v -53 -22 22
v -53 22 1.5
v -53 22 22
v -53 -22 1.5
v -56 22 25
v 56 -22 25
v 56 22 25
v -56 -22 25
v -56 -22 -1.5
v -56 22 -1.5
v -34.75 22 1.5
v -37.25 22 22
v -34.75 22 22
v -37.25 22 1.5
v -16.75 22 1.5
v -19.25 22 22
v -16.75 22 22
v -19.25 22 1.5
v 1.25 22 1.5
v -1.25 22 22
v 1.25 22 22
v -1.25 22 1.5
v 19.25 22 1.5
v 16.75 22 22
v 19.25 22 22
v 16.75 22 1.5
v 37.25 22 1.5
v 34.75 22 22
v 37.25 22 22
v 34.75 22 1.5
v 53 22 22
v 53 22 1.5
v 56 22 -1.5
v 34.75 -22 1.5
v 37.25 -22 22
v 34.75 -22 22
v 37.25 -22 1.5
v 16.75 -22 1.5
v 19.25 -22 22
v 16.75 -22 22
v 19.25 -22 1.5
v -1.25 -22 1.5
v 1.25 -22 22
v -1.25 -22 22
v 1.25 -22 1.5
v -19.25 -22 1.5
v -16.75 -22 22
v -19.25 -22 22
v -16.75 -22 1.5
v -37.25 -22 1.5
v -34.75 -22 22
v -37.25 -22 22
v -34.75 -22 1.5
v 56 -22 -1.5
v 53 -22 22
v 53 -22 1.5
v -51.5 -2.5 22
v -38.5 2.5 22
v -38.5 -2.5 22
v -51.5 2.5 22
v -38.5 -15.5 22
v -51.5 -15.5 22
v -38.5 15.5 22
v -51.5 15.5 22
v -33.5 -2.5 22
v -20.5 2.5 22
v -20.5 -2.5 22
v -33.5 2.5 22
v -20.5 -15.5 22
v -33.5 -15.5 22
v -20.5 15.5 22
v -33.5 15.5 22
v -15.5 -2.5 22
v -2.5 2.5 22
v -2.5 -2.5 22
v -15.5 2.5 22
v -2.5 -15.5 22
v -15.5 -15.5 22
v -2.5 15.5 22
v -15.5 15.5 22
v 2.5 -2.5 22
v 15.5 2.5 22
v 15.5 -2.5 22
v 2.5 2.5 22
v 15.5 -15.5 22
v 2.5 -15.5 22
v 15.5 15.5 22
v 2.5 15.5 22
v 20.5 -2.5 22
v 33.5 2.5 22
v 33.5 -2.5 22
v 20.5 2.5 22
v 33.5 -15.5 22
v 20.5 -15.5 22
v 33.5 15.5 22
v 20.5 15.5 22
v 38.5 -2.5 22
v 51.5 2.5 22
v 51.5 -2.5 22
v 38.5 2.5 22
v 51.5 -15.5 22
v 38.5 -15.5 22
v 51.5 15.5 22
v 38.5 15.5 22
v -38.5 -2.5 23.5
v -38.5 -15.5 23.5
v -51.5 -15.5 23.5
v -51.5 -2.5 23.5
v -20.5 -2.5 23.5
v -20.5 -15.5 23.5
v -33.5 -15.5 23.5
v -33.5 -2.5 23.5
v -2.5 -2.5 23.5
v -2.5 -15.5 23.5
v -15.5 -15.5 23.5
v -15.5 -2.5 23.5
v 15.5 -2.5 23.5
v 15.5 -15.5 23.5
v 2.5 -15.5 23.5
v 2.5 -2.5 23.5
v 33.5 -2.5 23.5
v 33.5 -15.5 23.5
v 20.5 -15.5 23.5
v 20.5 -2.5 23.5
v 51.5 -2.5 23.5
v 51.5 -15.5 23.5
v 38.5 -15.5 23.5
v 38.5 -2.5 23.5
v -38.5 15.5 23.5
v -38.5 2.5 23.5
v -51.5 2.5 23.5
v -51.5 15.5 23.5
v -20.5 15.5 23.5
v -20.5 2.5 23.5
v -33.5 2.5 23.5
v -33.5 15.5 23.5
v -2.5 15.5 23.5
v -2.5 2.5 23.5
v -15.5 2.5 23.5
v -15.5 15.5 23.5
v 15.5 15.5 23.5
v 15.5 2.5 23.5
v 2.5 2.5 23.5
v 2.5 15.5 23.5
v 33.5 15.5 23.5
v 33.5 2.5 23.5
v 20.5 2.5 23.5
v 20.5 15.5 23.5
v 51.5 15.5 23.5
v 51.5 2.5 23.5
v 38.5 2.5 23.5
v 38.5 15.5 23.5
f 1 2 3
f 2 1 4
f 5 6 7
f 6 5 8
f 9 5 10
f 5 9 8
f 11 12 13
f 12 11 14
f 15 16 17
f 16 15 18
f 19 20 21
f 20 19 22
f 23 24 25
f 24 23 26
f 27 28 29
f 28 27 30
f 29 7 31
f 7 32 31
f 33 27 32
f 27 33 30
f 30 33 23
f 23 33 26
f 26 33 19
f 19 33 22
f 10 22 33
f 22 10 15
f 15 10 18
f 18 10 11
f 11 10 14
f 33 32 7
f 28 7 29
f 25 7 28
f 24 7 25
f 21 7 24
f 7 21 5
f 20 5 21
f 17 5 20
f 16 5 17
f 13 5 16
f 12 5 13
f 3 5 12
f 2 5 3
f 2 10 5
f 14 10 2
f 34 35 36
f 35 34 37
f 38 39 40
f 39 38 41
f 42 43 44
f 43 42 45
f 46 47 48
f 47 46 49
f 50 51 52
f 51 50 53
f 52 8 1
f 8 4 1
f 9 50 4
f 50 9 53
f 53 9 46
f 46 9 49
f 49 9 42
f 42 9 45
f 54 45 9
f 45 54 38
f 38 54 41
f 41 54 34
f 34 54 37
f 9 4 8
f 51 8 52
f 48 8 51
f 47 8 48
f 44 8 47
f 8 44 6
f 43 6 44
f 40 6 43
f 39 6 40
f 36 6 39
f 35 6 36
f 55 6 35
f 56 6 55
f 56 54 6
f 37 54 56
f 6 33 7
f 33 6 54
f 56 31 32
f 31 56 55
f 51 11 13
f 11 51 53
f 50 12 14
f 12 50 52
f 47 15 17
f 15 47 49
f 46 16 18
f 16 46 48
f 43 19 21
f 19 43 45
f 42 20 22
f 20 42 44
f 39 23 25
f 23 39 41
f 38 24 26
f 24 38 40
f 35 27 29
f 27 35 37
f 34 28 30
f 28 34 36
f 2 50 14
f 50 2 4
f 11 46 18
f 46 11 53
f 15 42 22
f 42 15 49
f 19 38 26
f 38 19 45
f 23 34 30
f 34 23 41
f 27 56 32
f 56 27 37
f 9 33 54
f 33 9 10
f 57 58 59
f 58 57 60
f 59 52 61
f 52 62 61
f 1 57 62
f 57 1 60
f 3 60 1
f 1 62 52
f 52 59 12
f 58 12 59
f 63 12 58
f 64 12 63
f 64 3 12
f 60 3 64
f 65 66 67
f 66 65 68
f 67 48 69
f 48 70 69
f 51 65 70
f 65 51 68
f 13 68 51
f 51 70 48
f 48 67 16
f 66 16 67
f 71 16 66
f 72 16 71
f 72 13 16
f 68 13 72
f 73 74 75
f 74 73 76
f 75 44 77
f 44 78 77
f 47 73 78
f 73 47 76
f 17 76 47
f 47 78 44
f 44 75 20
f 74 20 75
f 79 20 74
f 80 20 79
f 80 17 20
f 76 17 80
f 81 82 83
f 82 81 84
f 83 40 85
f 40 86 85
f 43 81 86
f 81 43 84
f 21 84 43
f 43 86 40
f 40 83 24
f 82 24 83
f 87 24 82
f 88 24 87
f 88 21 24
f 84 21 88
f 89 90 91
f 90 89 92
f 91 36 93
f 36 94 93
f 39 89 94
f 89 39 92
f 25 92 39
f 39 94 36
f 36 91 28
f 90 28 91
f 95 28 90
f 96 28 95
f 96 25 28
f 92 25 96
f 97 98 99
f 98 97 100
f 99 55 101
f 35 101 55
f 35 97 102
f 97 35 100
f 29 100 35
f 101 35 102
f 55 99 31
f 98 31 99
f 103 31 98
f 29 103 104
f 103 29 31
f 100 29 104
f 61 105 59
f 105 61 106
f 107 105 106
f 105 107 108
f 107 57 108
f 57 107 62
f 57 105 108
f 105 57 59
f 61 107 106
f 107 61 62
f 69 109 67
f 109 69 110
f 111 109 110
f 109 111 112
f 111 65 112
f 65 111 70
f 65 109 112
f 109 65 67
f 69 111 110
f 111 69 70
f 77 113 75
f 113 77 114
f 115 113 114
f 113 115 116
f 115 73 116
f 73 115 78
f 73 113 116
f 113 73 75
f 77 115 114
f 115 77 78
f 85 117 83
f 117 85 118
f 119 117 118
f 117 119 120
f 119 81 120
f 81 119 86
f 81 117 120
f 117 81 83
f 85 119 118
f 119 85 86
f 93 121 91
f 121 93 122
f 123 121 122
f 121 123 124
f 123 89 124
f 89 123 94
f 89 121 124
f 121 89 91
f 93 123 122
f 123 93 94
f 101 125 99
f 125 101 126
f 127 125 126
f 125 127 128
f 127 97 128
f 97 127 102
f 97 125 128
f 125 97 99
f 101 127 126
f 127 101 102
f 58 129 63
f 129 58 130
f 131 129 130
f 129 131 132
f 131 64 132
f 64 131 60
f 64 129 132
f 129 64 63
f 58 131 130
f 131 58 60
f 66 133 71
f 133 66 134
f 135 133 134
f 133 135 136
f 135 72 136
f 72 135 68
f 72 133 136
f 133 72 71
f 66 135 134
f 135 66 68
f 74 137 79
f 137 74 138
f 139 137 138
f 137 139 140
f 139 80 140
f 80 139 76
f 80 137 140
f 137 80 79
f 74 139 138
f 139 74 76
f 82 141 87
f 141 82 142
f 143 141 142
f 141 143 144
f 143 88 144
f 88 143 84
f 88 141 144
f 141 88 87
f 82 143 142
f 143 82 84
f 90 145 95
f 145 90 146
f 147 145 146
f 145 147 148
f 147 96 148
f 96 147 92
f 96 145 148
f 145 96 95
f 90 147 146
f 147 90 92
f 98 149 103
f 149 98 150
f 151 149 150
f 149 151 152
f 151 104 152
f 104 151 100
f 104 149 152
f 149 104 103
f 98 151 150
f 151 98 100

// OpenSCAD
// 12-cuvette rack, printed standing on its base (z = 0 to 25)
// All dimensions in mm, measured with calipers.

// --- Plate dimensions (base & deck) ---
plate_x = 112;   // X extent of base and deck plates
plate_y = 44;    // Y extent of base and deck plates
base_t  = 3;     // base plate thickness (z 0..3)
deck_t  = 3;     // deck plate thickness (z 22..25)
deck_z  = 22;    // bottom of deck plate
total_h = 25;    // overall height of the rack

// --- Wall / rib dimensions ---
end_wall_t  = 3;    // thickness of the two end walls (along X)
rib_t       = 2.5;  // thickness of the five internal ribs (along X)
rib_x       = [-36, -18, 0, 18, 36]; // X centres of the five ribs

// --- Cuvette through-holes in the deck ---
hole_size = 13;    // 13 x 13 mm square through-holes
hole_pitch = 18;   // 18 mm centre-to-centre in both X and Y
hole_rows  = 2;    // rows along Y
hole_cols  = 6;    // columns along X

$fn = 64;

// ---------------------------------------------------------------------------
// Base plate (z 0..3), centred on origin
// ---------------------------------------------------------------------------
module base_plate() { translate([0, 0, 0])
    cube([plate_x, plate_y, base_t], center = true); }

// ---------------------------------------------------------------------------
// Deck plate (z 22..25), centred on origin
// ---------------------------------------------------------------------------
module deck_plate() { translate([0, 0, deck_z + deck_t / 2])
    cube([plate_x, plate_y, deck_t], center = true); }

// ---------------------------------------------------------------------------
// Seven upright walls, full height (z 0..25), full Y depth
// ---------------------------------------------------------------------------
module walls() { union() {
    // Two 3 mm end walls flush with the short ends
    for (sx = [-1, 1]) {
        x_c = sx * (plate_x / 2 - end_wall_t / 2);
        translate([x_c, 0, total_h / 2])
            cube([end_wall_t, plate_y, total_h], center = true);
    }
    // Five 2.5 mm internal ribs at the given X centres
    for (x_c = rib_x) {
        translate([x_c, 0, total_h / 2])
            cube([rib_t, plate_y, total_h], center = true);
    }
} }

// ---------------------------------------------------------------------------
// 12 square through-holes in the deck (2 rows x 6 cols, 18 mm pitch)
// Each cutter extends 1 mm past the top and bottom faces of the deck.
// ---------------------------------------------------------------------------
module hole_cutters() { union() {
    for (i = [0 : hole_rows - 1]) {
        y_c = (i - (hole_rows - 1) / 2) * hole_pitch;
        for (j = [0 : hole_cols - 1]) {
            x_c = (j - (hole_cols - 1) / 2) * hole_pitch;
            translate([x_c, y_c, deck_z - 1])
                cube([hole_size, hole_size, deck_t + 2], center = true);
        }
    }
} }

// ---------------------------------------------------------------------------
// Assemble the rack
// ---------------------------------------------------------------------------
difference() {
    union() {
        base_plate();
        deck_plate();
        walls();
    }
    hole_cutters();
}
